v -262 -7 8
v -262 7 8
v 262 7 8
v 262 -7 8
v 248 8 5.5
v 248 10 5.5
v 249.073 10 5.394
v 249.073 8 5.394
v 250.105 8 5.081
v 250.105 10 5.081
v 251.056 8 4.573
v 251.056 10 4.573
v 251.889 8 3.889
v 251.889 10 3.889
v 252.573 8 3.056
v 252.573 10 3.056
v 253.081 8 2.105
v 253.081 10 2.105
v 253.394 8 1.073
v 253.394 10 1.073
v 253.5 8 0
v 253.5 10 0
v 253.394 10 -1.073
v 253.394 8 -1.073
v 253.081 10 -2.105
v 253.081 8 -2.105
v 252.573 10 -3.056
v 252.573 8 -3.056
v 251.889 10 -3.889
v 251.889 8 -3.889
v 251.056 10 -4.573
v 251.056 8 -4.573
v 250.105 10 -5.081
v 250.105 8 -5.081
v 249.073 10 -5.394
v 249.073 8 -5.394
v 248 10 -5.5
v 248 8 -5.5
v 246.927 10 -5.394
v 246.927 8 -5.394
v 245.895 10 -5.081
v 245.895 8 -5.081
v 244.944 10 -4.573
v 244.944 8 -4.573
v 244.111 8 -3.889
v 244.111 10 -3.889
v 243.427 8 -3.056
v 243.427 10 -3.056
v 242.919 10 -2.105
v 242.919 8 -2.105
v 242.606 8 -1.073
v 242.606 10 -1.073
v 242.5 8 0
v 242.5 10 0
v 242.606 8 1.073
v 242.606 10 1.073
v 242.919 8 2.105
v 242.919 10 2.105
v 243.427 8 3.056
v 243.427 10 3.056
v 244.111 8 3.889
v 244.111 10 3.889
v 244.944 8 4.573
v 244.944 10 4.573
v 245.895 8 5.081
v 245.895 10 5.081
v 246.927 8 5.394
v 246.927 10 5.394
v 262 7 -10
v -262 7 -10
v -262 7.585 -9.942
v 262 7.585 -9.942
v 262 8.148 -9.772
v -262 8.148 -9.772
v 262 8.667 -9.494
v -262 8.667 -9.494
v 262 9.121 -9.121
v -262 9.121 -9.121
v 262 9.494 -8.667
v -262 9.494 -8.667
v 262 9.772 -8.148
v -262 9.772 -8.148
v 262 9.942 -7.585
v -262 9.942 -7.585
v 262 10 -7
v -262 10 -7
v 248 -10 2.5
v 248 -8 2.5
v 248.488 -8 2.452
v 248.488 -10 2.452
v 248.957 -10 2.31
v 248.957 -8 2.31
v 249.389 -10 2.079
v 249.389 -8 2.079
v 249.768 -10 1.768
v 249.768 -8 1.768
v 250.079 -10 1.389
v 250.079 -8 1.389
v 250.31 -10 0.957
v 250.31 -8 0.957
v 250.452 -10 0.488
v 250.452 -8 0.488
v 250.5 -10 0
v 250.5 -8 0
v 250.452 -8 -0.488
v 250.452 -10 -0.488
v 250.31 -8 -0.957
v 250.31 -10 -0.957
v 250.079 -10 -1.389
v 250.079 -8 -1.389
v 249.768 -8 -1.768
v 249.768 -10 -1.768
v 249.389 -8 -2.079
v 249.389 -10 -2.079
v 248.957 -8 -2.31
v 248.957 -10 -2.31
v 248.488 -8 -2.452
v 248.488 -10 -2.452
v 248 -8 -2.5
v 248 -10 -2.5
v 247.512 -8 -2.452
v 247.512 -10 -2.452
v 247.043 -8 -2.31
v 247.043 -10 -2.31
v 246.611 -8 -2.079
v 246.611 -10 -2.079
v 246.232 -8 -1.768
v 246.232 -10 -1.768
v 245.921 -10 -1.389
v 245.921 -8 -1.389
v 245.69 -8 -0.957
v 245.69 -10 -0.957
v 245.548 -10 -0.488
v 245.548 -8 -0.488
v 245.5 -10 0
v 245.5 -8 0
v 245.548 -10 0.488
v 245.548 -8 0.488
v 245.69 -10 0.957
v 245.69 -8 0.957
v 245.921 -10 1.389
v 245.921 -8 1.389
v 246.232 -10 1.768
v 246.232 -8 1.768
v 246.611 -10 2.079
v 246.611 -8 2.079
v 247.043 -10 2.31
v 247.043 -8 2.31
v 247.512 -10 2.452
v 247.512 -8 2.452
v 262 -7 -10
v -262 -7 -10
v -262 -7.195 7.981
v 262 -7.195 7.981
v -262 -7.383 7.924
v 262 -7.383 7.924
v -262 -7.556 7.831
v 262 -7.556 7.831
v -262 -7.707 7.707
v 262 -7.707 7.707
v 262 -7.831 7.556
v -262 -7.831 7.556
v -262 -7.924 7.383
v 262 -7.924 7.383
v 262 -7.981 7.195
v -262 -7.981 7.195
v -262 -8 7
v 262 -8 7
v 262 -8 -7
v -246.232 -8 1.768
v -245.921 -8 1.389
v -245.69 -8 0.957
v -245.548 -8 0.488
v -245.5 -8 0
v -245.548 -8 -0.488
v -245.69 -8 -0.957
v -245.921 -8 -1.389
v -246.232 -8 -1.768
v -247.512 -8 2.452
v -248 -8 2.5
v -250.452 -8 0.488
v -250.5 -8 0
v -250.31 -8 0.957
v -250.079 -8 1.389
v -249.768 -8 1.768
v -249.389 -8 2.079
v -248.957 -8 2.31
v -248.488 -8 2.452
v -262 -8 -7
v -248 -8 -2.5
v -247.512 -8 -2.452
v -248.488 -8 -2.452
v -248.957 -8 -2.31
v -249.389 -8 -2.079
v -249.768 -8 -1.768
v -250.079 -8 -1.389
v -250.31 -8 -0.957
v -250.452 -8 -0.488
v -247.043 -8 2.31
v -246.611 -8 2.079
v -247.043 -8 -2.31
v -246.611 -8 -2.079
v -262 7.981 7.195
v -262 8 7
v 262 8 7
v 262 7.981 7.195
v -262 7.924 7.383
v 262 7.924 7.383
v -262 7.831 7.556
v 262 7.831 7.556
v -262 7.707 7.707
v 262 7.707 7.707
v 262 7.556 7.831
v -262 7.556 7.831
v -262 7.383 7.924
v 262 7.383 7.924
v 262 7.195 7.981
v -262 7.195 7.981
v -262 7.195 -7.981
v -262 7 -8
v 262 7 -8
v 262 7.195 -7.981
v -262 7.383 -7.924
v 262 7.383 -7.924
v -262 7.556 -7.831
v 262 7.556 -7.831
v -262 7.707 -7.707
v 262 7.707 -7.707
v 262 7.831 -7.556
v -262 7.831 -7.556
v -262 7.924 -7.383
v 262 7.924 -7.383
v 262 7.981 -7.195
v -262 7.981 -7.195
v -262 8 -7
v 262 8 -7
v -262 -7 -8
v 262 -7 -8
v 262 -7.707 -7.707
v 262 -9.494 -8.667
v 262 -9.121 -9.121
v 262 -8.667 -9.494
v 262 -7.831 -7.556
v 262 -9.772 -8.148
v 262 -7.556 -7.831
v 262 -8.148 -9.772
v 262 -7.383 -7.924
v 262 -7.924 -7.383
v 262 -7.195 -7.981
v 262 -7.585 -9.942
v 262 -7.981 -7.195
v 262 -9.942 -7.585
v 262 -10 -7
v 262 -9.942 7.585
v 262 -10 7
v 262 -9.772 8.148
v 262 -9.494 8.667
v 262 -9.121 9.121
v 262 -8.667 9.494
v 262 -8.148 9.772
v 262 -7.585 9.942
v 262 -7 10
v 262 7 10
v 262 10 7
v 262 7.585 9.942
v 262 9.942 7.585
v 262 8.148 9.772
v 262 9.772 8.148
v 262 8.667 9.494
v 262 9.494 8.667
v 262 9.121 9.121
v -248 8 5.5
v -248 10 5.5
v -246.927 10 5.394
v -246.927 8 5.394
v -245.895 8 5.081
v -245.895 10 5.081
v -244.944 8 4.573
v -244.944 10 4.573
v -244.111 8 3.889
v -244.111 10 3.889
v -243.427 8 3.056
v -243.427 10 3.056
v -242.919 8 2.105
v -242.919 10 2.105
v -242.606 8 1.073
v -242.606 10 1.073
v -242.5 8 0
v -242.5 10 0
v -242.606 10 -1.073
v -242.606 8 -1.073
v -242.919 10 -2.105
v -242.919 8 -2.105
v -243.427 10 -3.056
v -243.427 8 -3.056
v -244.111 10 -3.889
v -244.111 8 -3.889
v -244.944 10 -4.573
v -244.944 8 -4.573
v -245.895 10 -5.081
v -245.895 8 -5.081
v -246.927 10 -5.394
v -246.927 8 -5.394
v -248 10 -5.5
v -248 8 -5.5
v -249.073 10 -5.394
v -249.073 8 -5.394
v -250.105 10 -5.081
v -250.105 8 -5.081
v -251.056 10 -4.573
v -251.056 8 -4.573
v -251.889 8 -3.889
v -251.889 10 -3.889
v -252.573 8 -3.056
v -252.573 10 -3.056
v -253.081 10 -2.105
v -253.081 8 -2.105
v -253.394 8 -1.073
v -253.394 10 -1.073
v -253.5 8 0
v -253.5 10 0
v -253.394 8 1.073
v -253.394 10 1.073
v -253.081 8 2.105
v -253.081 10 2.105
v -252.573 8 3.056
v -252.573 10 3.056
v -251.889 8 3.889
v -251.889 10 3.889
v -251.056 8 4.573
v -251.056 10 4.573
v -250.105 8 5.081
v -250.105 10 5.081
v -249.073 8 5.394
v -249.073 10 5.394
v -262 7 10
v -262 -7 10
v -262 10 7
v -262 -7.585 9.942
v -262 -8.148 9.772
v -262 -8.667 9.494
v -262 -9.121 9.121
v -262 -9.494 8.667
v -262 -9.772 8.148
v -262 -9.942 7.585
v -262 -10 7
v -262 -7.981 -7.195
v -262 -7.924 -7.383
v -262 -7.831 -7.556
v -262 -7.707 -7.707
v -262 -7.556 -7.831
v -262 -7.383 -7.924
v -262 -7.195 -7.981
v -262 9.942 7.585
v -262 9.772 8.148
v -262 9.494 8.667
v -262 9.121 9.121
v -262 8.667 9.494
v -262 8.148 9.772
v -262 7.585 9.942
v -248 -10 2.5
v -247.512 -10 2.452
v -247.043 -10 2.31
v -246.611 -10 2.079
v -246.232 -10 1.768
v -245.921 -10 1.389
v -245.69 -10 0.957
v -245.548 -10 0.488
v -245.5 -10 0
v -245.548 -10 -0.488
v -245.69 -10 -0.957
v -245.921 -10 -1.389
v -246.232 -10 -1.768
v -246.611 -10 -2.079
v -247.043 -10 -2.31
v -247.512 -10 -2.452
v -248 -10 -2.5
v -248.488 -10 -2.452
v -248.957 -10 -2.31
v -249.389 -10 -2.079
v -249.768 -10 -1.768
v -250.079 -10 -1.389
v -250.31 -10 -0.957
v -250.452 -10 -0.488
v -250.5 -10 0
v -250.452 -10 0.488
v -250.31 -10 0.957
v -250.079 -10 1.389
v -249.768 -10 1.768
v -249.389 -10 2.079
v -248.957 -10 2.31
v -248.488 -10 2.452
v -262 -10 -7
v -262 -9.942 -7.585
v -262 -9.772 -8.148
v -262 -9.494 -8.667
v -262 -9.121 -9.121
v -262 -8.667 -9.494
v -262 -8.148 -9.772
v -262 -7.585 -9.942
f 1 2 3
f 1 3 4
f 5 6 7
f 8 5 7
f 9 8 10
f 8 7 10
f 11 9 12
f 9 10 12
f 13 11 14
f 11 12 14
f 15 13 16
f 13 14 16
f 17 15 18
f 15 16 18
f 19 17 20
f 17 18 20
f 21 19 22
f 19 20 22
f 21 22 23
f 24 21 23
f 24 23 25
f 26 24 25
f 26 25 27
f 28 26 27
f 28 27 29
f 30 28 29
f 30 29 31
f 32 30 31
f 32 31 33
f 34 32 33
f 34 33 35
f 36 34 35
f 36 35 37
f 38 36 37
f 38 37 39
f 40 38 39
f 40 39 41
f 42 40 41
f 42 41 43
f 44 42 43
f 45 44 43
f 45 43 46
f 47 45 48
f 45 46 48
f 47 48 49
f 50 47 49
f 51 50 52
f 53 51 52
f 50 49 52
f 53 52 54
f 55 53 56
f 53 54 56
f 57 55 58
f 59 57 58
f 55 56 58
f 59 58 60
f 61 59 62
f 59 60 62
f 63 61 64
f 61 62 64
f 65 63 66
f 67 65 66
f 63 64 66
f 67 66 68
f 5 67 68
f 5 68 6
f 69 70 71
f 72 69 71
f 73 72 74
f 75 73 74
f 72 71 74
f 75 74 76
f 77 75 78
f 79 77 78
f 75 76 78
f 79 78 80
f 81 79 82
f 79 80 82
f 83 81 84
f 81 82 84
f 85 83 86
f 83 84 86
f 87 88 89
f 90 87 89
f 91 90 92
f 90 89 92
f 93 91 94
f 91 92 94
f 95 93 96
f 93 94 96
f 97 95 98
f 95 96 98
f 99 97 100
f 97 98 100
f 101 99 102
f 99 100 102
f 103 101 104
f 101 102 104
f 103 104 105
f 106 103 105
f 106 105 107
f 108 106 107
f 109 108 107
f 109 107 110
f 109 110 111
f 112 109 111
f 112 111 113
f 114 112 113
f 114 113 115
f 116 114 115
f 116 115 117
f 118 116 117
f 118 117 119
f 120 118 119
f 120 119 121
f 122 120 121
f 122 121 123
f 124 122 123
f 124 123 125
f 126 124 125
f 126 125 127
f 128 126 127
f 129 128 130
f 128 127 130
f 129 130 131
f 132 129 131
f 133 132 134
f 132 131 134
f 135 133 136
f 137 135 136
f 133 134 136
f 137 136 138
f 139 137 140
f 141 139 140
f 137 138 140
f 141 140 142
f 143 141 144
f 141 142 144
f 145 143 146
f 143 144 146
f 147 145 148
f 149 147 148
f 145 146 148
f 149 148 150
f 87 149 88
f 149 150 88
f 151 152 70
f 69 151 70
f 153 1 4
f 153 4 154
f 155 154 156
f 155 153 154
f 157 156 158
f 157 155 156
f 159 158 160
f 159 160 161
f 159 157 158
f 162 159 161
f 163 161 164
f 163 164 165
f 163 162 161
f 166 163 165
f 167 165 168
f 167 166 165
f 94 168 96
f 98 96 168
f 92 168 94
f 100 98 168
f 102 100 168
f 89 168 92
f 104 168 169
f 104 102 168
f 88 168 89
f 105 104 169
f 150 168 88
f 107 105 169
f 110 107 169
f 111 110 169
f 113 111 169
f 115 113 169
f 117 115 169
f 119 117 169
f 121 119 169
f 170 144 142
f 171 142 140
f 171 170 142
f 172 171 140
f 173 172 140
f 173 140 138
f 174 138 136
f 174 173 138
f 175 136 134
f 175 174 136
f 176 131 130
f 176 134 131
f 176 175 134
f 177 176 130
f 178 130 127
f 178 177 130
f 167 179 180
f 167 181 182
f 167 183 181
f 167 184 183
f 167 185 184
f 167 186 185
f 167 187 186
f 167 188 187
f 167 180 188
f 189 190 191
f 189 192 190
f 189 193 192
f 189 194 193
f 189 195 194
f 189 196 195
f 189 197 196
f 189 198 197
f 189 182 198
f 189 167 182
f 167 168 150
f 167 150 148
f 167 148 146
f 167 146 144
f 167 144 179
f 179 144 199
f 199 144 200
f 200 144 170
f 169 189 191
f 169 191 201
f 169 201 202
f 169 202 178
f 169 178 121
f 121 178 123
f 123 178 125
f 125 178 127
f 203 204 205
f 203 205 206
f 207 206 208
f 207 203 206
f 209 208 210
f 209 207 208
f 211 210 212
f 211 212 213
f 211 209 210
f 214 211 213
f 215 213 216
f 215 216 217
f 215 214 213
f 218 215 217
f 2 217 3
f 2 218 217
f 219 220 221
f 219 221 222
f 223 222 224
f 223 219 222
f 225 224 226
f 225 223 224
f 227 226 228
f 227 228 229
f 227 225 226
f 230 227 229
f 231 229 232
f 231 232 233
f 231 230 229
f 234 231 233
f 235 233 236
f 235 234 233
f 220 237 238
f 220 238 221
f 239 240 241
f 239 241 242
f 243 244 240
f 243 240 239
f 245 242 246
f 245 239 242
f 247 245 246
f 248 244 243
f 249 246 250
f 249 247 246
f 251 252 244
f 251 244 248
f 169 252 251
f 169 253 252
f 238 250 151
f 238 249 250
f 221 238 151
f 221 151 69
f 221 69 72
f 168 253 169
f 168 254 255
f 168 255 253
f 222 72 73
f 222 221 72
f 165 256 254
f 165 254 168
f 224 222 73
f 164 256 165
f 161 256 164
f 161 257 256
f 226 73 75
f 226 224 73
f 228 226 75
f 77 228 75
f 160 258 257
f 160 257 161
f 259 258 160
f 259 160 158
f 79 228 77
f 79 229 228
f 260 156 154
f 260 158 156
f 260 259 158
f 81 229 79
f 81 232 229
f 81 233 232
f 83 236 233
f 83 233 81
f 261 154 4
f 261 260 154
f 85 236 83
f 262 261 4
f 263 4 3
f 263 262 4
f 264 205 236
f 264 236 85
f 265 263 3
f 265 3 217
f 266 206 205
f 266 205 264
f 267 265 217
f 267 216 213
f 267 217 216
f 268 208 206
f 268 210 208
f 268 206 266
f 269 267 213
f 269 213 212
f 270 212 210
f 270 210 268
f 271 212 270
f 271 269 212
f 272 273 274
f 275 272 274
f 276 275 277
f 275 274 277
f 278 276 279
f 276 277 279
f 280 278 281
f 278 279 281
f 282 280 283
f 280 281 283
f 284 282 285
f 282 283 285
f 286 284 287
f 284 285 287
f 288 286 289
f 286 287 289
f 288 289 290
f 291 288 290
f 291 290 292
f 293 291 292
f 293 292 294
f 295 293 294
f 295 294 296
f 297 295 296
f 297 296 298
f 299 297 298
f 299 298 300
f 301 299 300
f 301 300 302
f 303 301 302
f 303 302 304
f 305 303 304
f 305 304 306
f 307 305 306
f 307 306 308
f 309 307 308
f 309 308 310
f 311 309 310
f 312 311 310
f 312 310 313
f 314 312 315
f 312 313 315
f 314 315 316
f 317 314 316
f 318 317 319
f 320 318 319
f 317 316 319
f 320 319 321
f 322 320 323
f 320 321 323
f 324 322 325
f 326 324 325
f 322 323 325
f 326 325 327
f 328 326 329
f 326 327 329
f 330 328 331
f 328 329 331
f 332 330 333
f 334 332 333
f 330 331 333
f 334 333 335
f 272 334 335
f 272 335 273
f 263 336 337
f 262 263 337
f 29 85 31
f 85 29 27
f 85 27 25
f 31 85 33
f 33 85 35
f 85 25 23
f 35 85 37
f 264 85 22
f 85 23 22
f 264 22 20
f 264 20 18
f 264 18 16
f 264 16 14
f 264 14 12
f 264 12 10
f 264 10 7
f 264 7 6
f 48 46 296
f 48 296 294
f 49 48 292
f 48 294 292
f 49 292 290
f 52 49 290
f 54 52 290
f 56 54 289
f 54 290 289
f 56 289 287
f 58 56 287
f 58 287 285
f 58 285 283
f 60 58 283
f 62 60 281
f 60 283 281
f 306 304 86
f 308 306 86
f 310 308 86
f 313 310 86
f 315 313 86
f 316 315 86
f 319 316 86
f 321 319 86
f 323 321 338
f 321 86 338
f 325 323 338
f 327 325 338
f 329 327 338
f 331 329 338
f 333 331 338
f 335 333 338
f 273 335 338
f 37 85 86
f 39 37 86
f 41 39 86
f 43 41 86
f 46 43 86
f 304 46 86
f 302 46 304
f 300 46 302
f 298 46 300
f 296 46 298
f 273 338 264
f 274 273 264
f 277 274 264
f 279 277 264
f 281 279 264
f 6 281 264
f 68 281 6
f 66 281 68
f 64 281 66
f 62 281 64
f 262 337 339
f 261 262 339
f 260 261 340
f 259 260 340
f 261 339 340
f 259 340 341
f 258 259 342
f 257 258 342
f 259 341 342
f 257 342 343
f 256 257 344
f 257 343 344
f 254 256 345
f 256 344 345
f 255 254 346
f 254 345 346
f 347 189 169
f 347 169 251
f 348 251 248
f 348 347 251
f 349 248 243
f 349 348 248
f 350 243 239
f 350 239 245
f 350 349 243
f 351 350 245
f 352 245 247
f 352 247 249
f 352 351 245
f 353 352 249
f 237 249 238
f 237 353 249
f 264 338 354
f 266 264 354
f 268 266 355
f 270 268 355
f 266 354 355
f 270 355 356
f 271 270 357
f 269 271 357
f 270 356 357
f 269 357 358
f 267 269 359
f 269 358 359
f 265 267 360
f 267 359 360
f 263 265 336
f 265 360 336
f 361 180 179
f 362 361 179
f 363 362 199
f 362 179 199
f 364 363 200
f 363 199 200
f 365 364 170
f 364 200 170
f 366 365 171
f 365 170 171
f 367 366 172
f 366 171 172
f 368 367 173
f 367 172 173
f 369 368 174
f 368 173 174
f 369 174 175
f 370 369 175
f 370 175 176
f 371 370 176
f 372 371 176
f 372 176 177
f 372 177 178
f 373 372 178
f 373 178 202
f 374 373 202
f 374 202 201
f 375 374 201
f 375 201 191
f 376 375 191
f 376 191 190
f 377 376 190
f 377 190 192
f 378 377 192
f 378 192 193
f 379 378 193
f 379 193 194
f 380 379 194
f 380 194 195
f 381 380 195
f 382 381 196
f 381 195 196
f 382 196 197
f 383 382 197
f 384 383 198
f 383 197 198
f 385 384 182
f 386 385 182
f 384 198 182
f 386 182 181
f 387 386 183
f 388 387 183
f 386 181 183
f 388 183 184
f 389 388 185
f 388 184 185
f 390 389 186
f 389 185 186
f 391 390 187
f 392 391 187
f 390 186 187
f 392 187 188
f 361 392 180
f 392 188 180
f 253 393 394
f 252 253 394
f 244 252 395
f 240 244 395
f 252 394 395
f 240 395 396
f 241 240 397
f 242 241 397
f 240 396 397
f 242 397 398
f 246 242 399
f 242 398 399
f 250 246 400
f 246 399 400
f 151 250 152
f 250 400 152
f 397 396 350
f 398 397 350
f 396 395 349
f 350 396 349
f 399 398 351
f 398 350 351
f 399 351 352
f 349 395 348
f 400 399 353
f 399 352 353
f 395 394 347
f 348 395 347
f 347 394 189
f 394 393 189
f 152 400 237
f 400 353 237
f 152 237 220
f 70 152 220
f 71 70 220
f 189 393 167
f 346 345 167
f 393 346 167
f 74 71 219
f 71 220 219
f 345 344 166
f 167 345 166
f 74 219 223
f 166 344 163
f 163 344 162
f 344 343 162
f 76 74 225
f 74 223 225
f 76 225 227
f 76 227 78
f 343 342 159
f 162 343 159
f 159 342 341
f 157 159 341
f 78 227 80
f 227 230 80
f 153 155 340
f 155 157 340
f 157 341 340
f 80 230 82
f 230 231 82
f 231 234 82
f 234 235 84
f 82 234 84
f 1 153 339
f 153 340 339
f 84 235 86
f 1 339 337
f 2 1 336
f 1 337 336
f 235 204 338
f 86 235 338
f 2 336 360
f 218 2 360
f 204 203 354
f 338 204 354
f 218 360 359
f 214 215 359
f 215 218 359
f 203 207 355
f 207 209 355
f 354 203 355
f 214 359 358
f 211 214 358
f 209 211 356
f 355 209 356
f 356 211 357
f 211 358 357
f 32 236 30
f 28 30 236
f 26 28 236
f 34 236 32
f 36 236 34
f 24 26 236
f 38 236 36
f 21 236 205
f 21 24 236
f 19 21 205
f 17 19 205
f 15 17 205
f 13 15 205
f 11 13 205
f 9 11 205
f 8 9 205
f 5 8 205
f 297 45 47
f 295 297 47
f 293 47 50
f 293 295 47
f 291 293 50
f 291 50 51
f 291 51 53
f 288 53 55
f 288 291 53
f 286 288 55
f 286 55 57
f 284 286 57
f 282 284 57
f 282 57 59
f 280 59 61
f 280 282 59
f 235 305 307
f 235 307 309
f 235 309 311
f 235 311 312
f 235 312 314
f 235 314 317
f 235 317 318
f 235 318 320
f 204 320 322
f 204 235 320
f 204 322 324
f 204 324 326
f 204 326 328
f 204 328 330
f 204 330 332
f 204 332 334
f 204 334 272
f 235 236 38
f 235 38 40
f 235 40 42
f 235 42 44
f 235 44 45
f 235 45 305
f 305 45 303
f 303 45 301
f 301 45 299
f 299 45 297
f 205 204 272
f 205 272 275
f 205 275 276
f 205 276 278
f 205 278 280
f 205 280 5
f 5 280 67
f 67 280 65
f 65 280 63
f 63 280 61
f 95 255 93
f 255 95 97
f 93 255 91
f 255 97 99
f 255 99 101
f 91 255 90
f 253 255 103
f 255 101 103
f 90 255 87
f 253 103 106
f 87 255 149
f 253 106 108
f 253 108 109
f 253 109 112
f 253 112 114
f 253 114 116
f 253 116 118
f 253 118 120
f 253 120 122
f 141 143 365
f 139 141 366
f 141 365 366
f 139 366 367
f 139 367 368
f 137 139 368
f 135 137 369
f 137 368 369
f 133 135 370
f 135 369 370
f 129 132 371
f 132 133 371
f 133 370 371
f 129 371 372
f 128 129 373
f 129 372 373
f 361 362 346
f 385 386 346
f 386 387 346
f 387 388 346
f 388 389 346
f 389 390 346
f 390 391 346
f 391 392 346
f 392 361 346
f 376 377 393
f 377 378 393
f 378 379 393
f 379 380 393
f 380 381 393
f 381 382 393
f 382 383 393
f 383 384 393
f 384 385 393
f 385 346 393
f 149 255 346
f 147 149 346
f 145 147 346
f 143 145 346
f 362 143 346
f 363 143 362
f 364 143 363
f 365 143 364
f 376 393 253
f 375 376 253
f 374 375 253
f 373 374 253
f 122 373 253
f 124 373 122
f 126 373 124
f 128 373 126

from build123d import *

# Parameters (mm, degrees)
F_20_X_20_X_2_1_DEPTH = 524
CUT_EXTRUDE_1_REACH   = 264.952
SKETCH_3_R            = 5.5
SKETCH_4_R            = 2.5
CUT_EXTRUDE_2_DEPTH   = 263.807914645


with BuildPart() as part:
    # Sketch1 → Квадратная труба 20 X 20 X 2(1) (new body)
    with BuildSketch(Plane.YZ.offset(-262)):
        with BuildLine():
            Line((-7, -10), (7, -10))
            ThreePointArc((7, -10), (9.121320344, -9.121320344), (10, -7))
            Line((10, -7), (10, 7))
            ThreePointArc((10, 7), (9.121320344, 9.121320344), (7, 10))
            Line((7, 10), (-7, 10))
            ThreePointArc((-7, 10), (-9.121320344, 9.121320344), (-10, 7))
            Line((-10, 7), (-10, -7))
            ThreePointArc((-10, -7), (-9.121320344, -9.121320344), (-7, -10))
        make_face()
        with BuildLine():
            Line((-7, -8), (7, -8))
            ThreePointArc((7, -8), (7.707106781, -7.707106781), (8, -7))
            Line((8, -7), (8, 7))
            ThreePointArc((8, 7), (7.707106781, 7.707106781), (7, 8))
            Line((7, 8), (-7, 8))
            ThreePointArc((-7, 8), (-7.707106781, 7.707106781), (-8, 7))
            Line((-8, 7), (-8, -7))
            ThreePointArc((-8, -7), (-7.707106781, -7.707106781), (-7, -8))
        make_face(mode=Mode.SUBTRACT)
    extrude(amount=F_20_X_20_X_2_1_DEPTH)

    # Эскиз3 → Вырез-Вытянуть1 (cut, up to next)
    with BuildSketch(Plane(origin=(0, 10, 0), x_dir=(1, 0, 0), z_dir=(0, 1, 0)), mode=Mode.PRIVATE) as cut_extrude_1_sk1:
        with Locations(Location((-248, 0, 0), (0, 0, 270))):
            Circle(SKETCH_3_R)
    cut_extrude_1_tool1 = extrude(cut_extrude_1_sk1.sketch, amount=-CUT_EXTRUDE_1_REACH, mode=Mode.PRIVATE) & part.part
    # Эскиз3 → Вырез-Вытянуть1 (cut, up to next)
    with BuildSketch(Plane(origin=(0, 10, 0), x_dir=(1, 0, 0), z_dir=(0, 1, 0)), mode=Mode.PRIVATE) as cut_extrude_1_sk2:
        with Locations(Location((248, 0, 0), (0, 0, 270))):
            Circle(SKETCH_3_R)
    cut_extrude_1_tool2 = extrude(cut_extrude_1_sk2.sketch, amount=-CUT_EXTRUDE_1_REACH, mode=Mode.PRIVATE) & part.part
    add(cut_extrude_1_tool1.solids().sort_by_distance((-248, 10, 0))[0], mode=Mode.SUBTRACT)
    add(cut_extrude_1_tool2.solids().sort_by_distance((248, 10, 0))[0], mode=Mode.SUBTRACT)

    # Эскиз4 → Вырез-Вытянуть2 (cut, through all)
    with BuildSketch(Plane(origin=(0, -8, 0), x_dir=(1, 0, 0), z_dir=(0, 1, 0))):
        with Locations(Location((-248, 0, 0), (0, 0, 270))):
            Circle(SKETCH_4_R)
        with Locations(Location((248, 0, 0), (0, 0, 270))):
            Circle(SKETCH_4_R)
    extrude(amount=-CUT_EXTRUDE_2_DEPTH, mode=Mode.SUBTRACT)


solid = part.part
